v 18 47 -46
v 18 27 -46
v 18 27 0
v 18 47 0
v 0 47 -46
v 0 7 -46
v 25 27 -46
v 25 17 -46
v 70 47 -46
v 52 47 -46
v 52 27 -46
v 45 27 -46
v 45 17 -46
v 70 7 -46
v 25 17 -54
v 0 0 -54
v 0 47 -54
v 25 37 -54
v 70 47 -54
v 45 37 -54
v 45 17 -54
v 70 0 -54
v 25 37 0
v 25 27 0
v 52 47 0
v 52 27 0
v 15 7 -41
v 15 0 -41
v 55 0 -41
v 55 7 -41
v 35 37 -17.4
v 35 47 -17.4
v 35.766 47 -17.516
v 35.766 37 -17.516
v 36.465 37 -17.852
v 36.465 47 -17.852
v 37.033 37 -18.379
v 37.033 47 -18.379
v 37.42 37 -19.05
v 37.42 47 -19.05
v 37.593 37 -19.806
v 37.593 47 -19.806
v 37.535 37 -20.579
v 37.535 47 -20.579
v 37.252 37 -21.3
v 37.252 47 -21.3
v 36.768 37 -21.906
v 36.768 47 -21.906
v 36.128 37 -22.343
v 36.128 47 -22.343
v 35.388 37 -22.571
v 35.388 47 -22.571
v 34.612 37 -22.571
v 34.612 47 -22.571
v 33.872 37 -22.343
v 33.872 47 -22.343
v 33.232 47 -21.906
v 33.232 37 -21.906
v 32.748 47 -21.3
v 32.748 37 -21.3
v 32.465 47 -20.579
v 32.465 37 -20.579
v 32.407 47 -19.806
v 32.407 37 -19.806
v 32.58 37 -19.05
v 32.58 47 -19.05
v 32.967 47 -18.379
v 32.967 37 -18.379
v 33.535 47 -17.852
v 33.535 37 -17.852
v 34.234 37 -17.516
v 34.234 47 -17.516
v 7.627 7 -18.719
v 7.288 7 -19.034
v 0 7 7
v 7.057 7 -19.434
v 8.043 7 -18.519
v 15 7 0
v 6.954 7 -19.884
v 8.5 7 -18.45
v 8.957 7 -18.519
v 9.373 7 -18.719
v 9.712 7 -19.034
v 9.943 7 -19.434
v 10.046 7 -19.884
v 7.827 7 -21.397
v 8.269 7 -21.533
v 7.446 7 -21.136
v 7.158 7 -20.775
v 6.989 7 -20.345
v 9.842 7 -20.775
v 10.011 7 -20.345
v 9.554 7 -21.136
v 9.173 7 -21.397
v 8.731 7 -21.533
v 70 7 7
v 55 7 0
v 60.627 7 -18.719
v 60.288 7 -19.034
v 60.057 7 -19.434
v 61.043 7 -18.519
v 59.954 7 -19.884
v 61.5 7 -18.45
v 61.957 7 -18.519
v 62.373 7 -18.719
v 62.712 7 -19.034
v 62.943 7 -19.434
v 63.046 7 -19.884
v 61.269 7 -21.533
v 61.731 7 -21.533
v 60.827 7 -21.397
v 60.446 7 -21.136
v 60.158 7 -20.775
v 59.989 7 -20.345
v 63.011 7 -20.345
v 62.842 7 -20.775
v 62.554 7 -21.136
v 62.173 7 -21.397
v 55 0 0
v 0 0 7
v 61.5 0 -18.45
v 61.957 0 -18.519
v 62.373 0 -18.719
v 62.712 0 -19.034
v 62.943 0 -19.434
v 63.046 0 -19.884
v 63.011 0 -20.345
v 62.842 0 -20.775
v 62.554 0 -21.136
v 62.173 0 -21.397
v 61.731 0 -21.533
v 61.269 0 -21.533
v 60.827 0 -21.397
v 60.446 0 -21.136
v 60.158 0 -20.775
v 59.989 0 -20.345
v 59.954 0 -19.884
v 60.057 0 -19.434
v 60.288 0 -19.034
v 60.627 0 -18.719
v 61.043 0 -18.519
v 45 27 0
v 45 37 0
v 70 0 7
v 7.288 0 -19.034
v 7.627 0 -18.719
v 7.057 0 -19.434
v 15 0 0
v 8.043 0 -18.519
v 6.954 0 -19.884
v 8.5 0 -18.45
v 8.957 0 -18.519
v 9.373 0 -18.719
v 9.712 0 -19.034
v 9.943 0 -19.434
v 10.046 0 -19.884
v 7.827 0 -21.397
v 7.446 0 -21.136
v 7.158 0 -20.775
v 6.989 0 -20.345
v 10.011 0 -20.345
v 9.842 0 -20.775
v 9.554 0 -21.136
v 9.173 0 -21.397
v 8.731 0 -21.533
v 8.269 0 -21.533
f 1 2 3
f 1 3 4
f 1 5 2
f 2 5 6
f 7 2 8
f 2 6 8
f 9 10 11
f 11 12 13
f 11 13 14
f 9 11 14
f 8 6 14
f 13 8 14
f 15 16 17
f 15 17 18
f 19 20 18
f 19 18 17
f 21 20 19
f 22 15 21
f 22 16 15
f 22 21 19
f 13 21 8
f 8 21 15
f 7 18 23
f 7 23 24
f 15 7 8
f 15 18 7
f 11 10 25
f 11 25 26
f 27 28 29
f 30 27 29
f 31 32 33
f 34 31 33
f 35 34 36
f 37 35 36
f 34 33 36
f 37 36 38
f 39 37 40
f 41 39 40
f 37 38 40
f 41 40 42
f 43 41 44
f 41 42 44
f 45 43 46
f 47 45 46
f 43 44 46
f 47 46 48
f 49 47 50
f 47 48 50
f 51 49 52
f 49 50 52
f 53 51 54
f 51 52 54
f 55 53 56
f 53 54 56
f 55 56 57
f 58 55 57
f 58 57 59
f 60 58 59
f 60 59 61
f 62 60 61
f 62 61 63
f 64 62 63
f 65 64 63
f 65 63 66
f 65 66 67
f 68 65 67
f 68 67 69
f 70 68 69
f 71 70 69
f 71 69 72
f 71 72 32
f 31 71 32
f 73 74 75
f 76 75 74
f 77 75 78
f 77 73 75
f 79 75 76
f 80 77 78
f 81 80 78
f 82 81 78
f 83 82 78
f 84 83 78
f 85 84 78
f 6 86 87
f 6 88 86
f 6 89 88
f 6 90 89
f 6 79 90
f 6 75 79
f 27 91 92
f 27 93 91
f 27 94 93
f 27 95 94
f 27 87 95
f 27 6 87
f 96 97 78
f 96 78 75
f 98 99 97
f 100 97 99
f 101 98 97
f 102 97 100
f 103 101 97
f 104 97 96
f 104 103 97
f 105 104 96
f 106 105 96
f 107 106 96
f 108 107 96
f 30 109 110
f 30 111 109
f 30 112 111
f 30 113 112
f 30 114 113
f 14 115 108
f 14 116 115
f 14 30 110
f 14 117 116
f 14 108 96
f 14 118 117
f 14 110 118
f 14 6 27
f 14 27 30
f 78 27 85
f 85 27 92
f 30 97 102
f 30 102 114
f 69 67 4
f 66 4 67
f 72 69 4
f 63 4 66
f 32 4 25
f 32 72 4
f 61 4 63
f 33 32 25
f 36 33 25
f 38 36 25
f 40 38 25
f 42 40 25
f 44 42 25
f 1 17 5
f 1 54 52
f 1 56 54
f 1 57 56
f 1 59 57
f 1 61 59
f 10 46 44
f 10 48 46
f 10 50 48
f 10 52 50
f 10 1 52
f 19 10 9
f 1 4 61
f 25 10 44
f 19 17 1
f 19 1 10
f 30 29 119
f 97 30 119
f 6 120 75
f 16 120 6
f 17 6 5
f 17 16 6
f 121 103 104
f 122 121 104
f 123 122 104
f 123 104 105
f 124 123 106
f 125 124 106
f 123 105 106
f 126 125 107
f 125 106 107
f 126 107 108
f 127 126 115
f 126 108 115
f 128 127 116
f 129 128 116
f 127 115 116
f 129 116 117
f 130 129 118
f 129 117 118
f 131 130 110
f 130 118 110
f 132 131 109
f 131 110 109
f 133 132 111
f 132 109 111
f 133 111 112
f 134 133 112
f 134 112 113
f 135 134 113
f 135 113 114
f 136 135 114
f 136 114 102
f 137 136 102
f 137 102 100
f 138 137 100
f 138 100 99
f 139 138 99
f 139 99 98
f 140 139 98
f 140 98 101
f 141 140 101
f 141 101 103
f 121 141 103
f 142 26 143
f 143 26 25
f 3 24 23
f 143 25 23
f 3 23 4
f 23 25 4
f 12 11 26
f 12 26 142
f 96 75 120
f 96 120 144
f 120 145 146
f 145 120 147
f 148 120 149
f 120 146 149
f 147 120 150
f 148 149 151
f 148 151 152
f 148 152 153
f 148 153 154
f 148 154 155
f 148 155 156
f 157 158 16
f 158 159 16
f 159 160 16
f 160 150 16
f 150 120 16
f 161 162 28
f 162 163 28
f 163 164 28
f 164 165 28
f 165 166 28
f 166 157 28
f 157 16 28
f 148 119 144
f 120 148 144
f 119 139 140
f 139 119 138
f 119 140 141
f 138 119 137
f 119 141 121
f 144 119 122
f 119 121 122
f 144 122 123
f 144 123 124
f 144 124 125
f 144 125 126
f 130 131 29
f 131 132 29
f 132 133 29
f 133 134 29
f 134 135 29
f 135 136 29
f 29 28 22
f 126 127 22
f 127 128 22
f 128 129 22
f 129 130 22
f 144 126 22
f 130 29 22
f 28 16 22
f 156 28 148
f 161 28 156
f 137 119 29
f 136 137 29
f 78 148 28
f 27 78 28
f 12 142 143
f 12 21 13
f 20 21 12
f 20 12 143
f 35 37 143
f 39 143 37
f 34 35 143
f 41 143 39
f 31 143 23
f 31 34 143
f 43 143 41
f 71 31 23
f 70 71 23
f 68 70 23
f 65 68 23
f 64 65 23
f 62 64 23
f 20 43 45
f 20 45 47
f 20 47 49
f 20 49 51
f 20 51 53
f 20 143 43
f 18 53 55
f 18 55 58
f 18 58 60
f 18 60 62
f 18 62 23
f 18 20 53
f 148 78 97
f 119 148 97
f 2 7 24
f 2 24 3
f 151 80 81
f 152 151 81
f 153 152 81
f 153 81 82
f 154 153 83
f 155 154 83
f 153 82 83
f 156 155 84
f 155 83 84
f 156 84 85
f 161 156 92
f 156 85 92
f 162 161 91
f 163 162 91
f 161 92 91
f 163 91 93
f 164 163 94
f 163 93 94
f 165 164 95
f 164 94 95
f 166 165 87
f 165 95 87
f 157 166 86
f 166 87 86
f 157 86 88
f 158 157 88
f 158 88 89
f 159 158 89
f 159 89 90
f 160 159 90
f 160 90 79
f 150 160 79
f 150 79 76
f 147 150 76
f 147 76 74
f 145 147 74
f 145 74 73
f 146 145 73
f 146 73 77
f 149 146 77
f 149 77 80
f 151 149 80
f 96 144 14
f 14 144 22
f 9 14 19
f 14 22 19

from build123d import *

# Parameters (mm, degrees)
BOSS_EXTRUDE1_DEPTH = 7
SKETCH4_R           = 1.55
CUT_EXTRUDE1_DEPTH  = 89.684835231
SKETCH5_W           = 70
SKETCH5_H           = 8
BOSS_EXTRUDE2_DEPTH = 40
SKETCH6_W           = 20
SKETCH6_H           = 20
CUT_EXTRUDE2_DEPTH  = 101.124921973
BOSS_EXTRUDE4_DEPTH = 46
SKETCH9_R           = 2.6
CUT_EXTRUDE3_DEPTH  = 101.124921973
SKETCH10_W          = 70
SKETCH10_H          = 7
BOSS_EXTRUDE5_DEPTH = 7


with BuildPart() as part:
    # Sketch1 → Boss-Extrude1 (new body)
    with BuildSketch(Plane(origin=(0, 0, 0), x_dir=(1, 0, 0), z_dir=(0, 1, 0))):
        Polygon((0, 54), (0, 0), (15, 0), (15, 41), (55, 41), (55, 0), (70, 0), (70, 54), align=None)
    extrude(amount=BOSS_EXTRUDE1_DEPTH)

    # Sketch4 → Cut-Extrude1 (cut, through all)
    with BuildSketch(Plane(origin=(0, 7, 0), x_dir=(1, 0, 0), z_dir=(0, 1, 0))):
        with Locations(Location((8.5, 20, 0), (0, 0, 270))):
            Circle(SKETCH4_R)
        with Locations(Location((61.5, 20, 0), (0, 0, 270))):
            Circle(SKETCH4_R)
    extrude(amount=-CUT_EXTRUDE1_DEPTH, mode=Mode.SUBTRACT)

    # Sketch5 → Boss-Extrude2 (add)
    with BuildSketch(Plane(origin=(0, 7, 0), x_dir=(1, 0, 0), z_dir=(0, 1, 0))):
        with Locations((35, 50)):
            Rectangle(SKETCH5_W, SKETCH5_H)
    extrude(amount=BOSS_EXTRUDE2_DEPTH)

    # Sketch6 → Cut-Extrude2 (cut, through all)
    with BuildSketch(Plane(origin=(0, 0, -54), x_dir=(-1, 0, 0), z_dir=(0, 0, -1))):
        with Locations((-35, 27)):
            Rectangle(SKETCH6_W, SKETCH6_H)
    extrude(amount=-CUT_EXTRUDE2_DEPTH, mode=Mode.SUBTRACT)

    # Sketch8 → Boss-Extrude4 (add)
    with BuildSketch(Plane.XY.offset(-46)):
        Polygon((18, 47), (52, 47), (52, 27), (45, 27), (45, 37), (25, 37), (25, 27), (18, 27), align=None)
    extrude(amount=BOSS_EXTRUDE4_DEPTH)

    # Sketch9 → Cut-Extrude3 (cut, through all)
    with BuildSketch(Plane(origin=(0, 47, 0), x_dir=(1, 0, 0), z_dir=(0, 1, 0))):
        with Locations(Location((35, 20, 0), (0, 0, 270))):
            Circle(SKETCH9_R)
    extrude(amount=-CUT_EXTRUDE3_DEPTH, mode=Mode.SUBTRACT)

    # Sketch10 → Boss-Extrude5 (add)
    with BuildSketch(Plane.XY):
        with Locations((35, 3.5)):
            Rectangle(SKETCH10_W, SKETCH10_H)
    extrude(amount=BOSS_EXTRUDE5_DEPTH)


solid = part.part
